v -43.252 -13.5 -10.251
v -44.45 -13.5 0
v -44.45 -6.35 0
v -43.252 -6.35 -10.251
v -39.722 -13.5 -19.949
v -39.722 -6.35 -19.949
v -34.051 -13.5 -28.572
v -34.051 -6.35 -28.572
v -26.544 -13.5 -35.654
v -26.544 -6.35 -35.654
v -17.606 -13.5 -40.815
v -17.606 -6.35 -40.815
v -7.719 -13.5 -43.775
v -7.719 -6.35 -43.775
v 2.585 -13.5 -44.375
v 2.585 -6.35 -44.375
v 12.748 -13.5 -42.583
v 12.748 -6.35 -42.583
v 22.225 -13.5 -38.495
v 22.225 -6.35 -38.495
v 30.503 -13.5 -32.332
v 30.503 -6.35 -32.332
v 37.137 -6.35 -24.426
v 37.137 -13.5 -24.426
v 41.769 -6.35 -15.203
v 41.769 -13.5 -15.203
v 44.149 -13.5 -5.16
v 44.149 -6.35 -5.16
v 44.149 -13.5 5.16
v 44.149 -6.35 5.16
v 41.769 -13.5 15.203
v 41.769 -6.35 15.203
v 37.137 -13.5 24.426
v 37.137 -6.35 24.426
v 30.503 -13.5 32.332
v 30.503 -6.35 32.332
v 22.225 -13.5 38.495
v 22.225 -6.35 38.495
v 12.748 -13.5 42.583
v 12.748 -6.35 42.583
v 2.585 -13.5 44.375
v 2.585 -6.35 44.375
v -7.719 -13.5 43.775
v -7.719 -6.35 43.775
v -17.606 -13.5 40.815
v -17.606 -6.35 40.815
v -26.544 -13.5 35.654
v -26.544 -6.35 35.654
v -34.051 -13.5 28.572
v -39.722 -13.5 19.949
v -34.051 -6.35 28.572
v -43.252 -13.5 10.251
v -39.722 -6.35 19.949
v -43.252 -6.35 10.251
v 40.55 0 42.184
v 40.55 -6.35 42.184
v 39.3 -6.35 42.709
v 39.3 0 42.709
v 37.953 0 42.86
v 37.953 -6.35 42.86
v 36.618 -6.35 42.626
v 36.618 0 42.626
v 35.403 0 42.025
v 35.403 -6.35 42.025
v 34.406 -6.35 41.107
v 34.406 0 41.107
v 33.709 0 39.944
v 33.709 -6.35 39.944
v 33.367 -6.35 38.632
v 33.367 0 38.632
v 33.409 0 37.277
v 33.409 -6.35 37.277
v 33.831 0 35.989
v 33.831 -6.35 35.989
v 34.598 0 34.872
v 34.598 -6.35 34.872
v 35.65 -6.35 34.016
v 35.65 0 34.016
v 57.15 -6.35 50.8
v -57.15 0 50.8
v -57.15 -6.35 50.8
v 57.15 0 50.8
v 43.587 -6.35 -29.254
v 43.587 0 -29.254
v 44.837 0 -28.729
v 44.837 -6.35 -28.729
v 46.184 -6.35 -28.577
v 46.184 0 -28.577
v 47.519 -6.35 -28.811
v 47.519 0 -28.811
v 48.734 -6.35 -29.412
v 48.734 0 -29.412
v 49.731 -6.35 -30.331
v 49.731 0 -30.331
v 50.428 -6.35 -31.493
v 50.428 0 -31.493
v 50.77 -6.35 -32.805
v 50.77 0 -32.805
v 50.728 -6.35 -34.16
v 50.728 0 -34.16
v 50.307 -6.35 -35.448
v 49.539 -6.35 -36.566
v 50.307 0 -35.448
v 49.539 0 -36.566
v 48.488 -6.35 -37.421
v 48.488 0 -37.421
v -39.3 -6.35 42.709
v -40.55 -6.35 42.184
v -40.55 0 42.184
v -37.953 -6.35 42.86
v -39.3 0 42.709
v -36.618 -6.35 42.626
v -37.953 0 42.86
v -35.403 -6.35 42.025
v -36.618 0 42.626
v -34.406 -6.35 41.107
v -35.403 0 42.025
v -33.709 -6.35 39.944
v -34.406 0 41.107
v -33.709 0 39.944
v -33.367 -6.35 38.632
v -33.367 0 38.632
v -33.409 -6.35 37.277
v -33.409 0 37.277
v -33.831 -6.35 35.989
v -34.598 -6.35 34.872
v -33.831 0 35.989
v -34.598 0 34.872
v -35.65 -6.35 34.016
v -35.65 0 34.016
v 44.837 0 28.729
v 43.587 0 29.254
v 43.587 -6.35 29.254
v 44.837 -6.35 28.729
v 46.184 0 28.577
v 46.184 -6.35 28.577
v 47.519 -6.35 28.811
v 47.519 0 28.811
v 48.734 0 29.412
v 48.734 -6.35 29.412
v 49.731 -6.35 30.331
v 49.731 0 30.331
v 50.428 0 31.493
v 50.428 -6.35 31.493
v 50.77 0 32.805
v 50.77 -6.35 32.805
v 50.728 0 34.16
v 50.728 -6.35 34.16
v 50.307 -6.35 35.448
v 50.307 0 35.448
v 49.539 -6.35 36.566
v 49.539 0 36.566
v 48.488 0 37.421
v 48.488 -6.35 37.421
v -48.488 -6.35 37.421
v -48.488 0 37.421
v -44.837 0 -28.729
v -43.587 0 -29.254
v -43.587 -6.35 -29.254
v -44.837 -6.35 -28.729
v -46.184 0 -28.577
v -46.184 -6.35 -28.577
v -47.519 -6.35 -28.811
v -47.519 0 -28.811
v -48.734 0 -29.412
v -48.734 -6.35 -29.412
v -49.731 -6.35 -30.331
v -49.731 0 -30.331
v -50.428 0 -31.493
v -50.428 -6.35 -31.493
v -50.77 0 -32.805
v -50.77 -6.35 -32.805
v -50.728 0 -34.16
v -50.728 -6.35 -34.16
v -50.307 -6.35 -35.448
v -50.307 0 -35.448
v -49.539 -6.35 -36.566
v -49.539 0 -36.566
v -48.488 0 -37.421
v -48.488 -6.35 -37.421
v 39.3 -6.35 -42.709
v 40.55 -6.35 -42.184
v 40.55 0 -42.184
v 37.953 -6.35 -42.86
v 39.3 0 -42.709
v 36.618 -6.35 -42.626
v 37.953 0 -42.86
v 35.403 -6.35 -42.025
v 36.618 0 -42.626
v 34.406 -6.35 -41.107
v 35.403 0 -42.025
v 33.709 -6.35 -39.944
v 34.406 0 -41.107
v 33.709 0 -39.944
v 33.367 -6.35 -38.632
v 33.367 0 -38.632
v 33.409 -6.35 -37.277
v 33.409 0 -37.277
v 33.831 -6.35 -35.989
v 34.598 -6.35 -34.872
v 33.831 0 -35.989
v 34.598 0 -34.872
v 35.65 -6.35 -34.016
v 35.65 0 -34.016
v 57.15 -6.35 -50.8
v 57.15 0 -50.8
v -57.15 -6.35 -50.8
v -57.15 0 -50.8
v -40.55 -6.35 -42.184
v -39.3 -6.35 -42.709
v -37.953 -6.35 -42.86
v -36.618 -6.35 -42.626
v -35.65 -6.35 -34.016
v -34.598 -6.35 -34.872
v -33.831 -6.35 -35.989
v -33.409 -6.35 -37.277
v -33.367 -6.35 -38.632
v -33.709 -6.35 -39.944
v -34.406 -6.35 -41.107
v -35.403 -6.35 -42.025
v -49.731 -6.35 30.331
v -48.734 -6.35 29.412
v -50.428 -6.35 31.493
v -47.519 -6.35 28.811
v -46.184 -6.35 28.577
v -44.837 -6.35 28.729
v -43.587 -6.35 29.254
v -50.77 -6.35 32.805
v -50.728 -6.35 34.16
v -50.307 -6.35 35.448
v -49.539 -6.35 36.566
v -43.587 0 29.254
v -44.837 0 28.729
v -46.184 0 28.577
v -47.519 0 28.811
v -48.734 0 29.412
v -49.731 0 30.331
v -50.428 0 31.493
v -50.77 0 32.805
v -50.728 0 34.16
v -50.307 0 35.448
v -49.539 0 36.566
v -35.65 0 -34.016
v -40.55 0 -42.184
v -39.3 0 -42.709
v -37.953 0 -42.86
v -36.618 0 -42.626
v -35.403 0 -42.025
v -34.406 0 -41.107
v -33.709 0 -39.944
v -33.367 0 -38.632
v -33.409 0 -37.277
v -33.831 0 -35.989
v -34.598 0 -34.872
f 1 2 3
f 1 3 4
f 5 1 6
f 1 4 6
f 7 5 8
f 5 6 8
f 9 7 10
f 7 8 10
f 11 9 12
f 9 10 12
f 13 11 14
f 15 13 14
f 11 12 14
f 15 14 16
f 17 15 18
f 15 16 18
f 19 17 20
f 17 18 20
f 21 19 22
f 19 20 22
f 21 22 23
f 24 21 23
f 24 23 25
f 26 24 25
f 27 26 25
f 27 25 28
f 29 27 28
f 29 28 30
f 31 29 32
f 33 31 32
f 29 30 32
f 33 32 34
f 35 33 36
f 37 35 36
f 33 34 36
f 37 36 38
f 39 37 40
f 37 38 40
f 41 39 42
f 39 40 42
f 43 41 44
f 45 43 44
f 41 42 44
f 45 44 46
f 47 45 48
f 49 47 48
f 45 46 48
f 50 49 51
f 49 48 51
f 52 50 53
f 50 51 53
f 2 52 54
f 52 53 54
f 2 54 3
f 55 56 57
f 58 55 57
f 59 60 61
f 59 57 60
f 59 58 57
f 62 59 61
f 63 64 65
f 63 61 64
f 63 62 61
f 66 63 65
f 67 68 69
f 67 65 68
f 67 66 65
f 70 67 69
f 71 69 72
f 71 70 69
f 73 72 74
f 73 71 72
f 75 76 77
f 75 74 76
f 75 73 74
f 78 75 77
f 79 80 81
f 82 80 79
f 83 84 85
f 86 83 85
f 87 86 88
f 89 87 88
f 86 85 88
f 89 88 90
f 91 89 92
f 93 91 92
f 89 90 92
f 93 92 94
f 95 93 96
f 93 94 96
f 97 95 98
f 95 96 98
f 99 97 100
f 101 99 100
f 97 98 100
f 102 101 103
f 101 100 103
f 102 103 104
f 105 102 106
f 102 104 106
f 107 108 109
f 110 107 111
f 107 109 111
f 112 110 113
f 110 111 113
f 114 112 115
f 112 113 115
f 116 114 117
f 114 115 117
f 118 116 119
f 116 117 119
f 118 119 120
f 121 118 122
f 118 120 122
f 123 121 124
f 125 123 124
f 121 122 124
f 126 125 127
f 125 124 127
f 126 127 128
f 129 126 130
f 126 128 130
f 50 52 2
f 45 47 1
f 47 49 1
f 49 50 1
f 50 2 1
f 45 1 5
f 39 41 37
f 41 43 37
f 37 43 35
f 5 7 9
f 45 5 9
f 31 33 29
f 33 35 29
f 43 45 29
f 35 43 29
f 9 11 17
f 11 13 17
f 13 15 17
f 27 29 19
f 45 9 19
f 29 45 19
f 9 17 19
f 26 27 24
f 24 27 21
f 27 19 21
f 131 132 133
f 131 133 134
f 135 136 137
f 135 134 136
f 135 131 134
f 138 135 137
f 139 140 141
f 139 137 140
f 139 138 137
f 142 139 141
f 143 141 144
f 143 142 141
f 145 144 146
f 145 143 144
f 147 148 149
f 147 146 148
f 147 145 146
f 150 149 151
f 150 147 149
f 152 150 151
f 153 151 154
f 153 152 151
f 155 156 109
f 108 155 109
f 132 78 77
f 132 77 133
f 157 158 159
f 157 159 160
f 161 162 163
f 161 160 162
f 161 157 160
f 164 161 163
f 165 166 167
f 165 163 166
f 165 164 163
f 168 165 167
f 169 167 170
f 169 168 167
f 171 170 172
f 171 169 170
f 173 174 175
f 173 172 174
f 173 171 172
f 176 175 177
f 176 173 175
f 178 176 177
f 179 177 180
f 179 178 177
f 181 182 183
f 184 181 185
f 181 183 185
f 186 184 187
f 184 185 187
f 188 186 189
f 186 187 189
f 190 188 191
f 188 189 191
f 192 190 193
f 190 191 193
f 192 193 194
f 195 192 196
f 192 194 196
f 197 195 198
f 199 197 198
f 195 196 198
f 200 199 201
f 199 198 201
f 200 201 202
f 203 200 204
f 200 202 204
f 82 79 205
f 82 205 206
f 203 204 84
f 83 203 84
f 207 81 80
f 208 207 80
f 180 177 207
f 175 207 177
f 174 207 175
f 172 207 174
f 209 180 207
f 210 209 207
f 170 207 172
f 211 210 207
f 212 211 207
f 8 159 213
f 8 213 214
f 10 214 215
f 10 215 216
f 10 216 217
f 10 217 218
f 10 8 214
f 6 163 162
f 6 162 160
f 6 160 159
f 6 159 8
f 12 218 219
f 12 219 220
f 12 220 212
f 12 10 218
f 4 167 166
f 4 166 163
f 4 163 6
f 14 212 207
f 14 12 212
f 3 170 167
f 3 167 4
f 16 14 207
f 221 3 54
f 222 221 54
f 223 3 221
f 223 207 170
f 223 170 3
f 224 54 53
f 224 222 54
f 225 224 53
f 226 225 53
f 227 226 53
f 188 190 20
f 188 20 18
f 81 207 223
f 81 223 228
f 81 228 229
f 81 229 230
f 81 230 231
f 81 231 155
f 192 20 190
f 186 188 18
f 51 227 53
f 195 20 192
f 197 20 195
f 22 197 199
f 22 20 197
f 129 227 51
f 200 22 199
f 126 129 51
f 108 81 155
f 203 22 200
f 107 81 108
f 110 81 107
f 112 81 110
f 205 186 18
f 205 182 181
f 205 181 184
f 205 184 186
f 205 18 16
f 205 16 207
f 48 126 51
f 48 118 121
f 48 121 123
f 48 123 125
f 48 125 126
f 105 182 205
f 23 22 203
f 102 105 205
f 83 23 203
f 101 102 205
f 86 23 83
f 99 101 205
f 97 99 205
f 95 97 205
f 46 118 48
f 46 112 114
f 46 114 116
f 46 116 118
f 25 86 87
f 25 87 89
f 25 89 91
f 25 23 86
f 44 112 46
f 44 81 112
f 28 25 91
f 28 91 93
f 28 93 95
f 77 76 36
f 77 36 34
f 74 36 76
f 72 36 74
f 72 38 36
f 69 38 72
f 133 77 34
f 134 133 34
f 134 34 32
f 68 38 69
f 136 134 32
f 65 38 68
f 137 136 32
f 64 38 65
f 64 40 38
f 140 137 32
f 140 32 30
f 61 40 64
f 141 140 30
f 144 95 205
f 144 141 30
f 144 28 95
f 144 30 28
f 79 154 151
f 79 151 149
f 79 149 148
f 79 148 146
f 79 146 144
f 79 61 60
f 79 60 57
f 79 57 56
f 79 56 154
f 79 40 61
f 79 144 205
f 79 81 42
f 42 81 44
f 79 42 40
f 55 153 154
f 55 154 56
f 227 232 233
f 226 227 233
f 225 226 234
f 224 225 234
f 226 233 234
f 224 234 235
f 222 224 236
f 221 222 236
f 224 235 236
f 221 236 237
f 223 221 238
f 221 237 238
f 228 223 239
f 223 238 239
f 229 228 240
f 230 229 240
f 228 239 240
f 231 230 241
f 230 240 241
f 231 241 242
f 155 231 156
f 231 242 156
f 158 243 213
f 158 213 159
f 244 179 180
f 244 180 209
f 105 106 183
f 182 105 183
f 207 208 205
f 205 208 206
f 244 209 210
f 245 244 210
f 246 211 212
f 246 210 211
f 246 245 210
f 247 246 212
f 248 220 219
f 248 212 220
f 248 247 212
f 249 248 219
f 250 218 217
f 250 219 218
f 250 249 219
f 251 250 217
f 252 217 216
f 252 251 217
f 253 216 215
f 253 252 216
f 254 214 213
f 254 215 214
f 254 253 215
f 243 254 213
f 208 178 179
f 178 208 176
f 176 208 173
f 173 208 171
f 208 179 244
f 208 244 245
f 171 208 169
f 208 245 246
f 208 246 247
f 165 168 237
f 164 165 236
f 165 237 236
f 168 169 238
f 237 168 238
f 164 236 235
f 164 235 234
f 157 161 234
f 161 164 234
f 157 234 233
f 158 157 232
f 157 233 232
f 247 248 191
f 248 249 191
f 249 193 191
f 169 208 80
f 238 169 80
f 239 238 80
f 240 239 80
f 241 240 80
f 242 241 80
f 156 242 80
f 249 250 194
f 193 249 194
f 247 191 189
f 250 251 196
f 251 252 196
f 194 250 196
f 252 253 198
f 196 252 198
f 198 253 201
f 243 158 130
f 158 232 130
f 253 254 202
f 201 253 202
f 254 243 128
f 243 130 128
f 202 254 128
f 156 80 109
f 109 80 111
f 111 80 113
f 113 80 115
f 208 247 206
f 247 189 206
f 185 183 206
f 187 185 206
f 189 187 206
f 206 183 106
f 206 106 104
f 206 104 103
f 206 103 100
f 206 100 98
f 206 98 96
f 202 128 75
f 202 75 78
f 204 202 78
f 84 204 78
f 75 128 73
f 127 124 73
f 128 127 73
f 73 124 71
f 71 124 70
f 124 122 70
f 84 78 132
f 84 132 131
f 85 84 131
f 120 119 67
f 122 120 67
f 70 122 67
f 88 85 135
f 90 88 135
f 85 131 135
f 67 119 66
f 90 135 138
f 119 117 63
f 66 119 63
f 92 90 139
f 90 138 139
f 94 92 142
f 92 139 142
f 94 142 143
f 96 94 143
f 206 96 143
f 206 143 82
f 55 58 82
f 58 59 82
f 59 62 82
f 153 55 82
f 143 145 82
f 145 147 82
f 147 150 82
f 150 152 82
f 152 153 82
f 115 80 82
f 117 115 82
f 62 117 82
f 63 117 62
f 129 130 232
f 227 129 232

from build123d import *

# Parameters (mm, degrees)
SKETCH1_W               = 114.3
SKETCH1_H               = 6.35
BOSS_EXTRUDE1_DEPTH     = 50.8
F_1_2_HOLES_DEPTH       = 77.727342
BOSS_EXTRUDE5_DEPTH     = 6.35
BOSS_EXTRUDE6_DEPTH     = 4.7625
SKETCH15_R              = 3.96875
BOSS_EXTRUDE7_DEPTH     = 2.54
SKETCH16_R              = 6.35
BOSS_EXTRUDE8_DEPTH     = 4.7625
SKETCH7_W               = 200.622007
SKETCH7_H               = 97.79
BOSS_EXTRUDE2_DEPTH     = 225.2599
CUT_EXTRUDE1_DEPTH      = 322.008202
CUT_EXTRUDE1_DEPTH_BACK = 322.008202
CUT_EXTRUDE3_DEPTH      = 230.782863
CUT_EXTRUDE3_DEPTH_BACK = 230.782863
SKETCH9_OUTSIDE_W       = 174.676
SKETCH9_OUTSIDE_H       = 325.489
BOSS_EXTRUDE3_DEPTH     = 7.9375
SKETCH11_OUTSIDE_W      = 1426.344
SKETCH11_OUTSIDE_H      = 1450.156
SKETCH11_OUTSIDE_R      = 11.1125
CUT_EXTRUDE4_DEPTH      = 324.56132
CUT_EXTRUDE4_DRAFT      = -60
SKETCH12_R              = 10.795
BOSS_EXTRUDE4_DEPTH     = 85.09
SKETCH17_R              = 1440.18
CUT_EXTRUDE5_DEPTH      = 1397


with BuildPart() as part:
    # Sketch1 → Boss-Extrude1 (new, symmetric)
    with BuildSketch(Plane.XY):
        with Locations((0, -3.175)):
            Rectangle(SKETCH1_W, SKETCH1_H)
    extrude(amount=BOSS_EXTRUDE1_DEPTH, both=True)

    # Sketch2 → 1-2 holes (cut, through all)
    with BuildSketch(Plane(origin=(0, 0, 0), x_dir=(1, 0, 0), z_dir=(0, 1, 0))):
        with BuildLine():
            Line((-35.649714, 34.01619), (-43.587214, 29.25369))
            ThreePointArc((-43.587214, 29.25369), (-50.12131, 30.887214), (-48.487786, 37.42131))
            Line((-48.487786, 37.42131), (-40.550286, 42.18381))
            ThreePointArc((-40.550286, 42.18381), (-34.01619, 40.550286), (-35.649714, 34.01619))
        make_face()
        with BuildLine():
            Line((-35.649714, -34.01619), (-43.587214, -29.25369))
            ThreePointArc((-43.587214, -29.25369), (-50.12131, -30.887214), (-48.487786, -37.42131))
            Line((-48.487786, -37.42131), (-40.550286, -42.18381))
            ThreePointArc((-40.550286, -42.18381), (-34.01619, -40.550286), (-35.649714, -34.01619))
        make_face()
        with BuildLine():
            Line((35.649714, 34.01619), (43.587214, 29.25369))
            ThreePointArc((43.587214, 29.25369), (50.12131, 30.887214), (48.487786, 37.42131))
            Line((48.487786, 37.42131), (40.550286, 42.18381))
            ThreePointArc((40.550286, 42.18381), (34.01619, 40.550286), (35.649714, 34.01619))
        make_face()
        with BuildLine():
            Line((35.649714, -34.01619), (43.587214, -29.25369))
            ThreePointArc((43.587214, -29.25369), (50.12131, -30.887214), (48.487786, -37.42131))
            Line((48.487786, -37.42131), (40.550286, -42.18381))
            ThreePointArc((40.550286, -42.18381), (34.01619, -40.550286), (35.649714, -34.01619))
        make_face()
    extrude(amount=-F_1_2_HOLES_DEPTH, mode=Mode.SUBTRACT)


with BuildPart() as body_2:
    # Sketch4 → Revolve1 (revolve)
    with BuildSketch(Plane.XY, mode=Mode.PRIVATE) as revolve1_sk:
        Polygon((0, -27.1526), (43.18, -27.1526), (43.18, -16.0401), (40.64, -16.0401), (40.64, -13.5001), (44.45, -13.5001), (44.45, -6.35), (0, -6.35), align=None)
    revolve(revolve1_sk.sketch.rotate(Axis((0, -6.35, 0), (0, -1, 0)), 180), axis=Axis((0, -6.35, 0), (0, -1, 0)))


with BuildPart() as body_3:
    # Sketch6 → Revolve2 (revolve)
    with BuildSketch(Plane(origin=(-69.85, 0, 0), x_dir=(0, 0, -1), z_dir=(1, 0, 0)), mode=Mode.PRIVATE) as revolve2_sk:
        with BuildLine():
            Line((-35.56, -89.8525), (-35.56, -62.143409))
            ThreePointArc((-35.56, -62.143409), (-31.772624, -52.999876), (-22.629091, -49.2125))
            Line((-22.629091, -49.2125), (-19.800455, -49.2125))
            Line((-19.800455, -49.2125), (-19.800455, -51.59375))
            Line((-19.800455, -51.59375), (-14.143182, -51.59375))
            Line((-14.143182, -51.59375), (-14.143182, -49.2125))
            Line((-14.143182, -49.2125), (-8.485909, -49.2125))
            Line((-8.485909, -49.2125), (-8.485909, -51.59375))
            Line((-8.485909, -51.59375), (-2.828636, -51.59375))
            Line((-2.828636, -51.59375), (-2.828636, -49.2125))
            Line((-2.828636, -49.2125), (2.828636, -49.2125))
            Line((2.828636, -49.2125), (2.828636, -51.59375))
            Line((2.828636, -51.59375), (8.485909, -51.59375))
            Line((8.485909, -51.59375), (8.485909, -49.2125))
            Line((8.485909, -49.2125), (14.143182, -49.2125))
            Line((14.143182, -49.2125), (14.143182, -51.59375))
            Line((14.143182, -51.59375), (19.800455, -51.59375))
            Line((19.800455, -51.59375), (19.800455, -49.2125))
            Line((19.800455, -49.2125), (22.629091, -49.2125))
            ThreePointArc((22.629091, -49.2125), (31.772624, -52.999876), (35.56, -62.143409))
            Line((35.56, -62.143409), (35.56, -89.8525))
            Line((35.56, -89.8525), (36.83, -89.8525))
            Line((36.83, -89.8525), (36.83, -92.3925))
            Line((36.83, -92.3925), (33.655, -92.3925))
            ThreePointArc((33.655, -92.3925), (29.164872, -94.252372), (27.305, -98.7425))
            ThreePointArc((27.305, -98.7425), (25.636711, -103.032498), (21.508439, -105.068336))
            Line((21.508439, -105.068336), (5.438281, -106.474293))
            ThreePointArc((5.438281, -106.474293), (3.374144, -107.492212), (2.54, -109.637211))
            Line((2.54, -109.637211), (2.54, -130.175))
            Line((2.54, -130.175), (36.83, -130.175))
            Line((36.83, -130.175), (40.005, -130.175))
            Line((40.005, -130.175), (40.005, -150.8125))
            Line((40.005, -150.8125), (-40.005, -150.8125))
            Line((-40.005, -150.8125), (-40.005, -130.175))
            Line((-40.005, -130.175), (-36.83, -130.175))
            Line((-36.83, -130.175), (-2.54, -130.175))
            Line((-2.54, -130.175), (-2.54, -109.637211))
            ThreePointArc((-2.54, -109.637211), (-3.374144, -107.492212), (-5.438281, -106.474293))
            Line((-5.438281, -106.474293), (-21.508439, -105.068336))
            ThreePointArc((-21.508439, -105.068336), (-25.636711, -103.032498), (-27.305, -98.7425))
            ThreePointArc((-27.305, -98.7425), (-29.164872, -94.252372), (-33.655, -92.3925))
            Line((-33.655, -92.3925), (-36.83, -92.3925))
            Line((-36.83, -92.3925), (-36.83, -89.8525))
            Line((-36.83, -89.8525), (-35.56, -89.8525))
        make_face()
    revolve(revolve2_sk.sketch.rotate(Axis((-69.85, -150.8125, 111.145304), (0, 0, -1)), 90), axis=Axis((-69.85, -150.8125, 111.145304), (0, 0, -1)))

    # Sketch13 → Boss-Extrude5 (add)
    with BuildSketch(Plane.XY.offset(2.54)):
        with BuildLine():
            ThreePointArc((-101.041813, -136.474589), (-98.965326, -121.697174), (-84.187911, -119.620687))
            ThreePointArc((-84.187911, -119.620687), (-69.85, -123.32907), (-55.512089, -119.620687))
            ThreePointArc((-55.512089, -119.620687), (-40.734674, -121.697174), (-38.658187, -136.474589))
            ThreePointArc((-38.658187, -136.474589), (-42.36657, -150.8125), (-38.658187, -165.150411))
            ThreePointArc((-38.658187, -165.150411), (-40.734674, -179.927826), (-55.512089, -182.004313))
            ThreePointArc((-55.512089, -182.004313), (-69.85, -178.29593), (-84.187911, -182.004313))
            ThreePointArc((-84.187911, -182.004313), (-98.965326, -179.927826), (-101.041813, -165.150411))
            ThreePointArc((-101.041813, -165.150411), (-97.33343, -150.8125), (-101.041813, -136.474589))
        make_face()
    extrude(amount=BOSS_EXTRUDE5_DEPTH)

    # Sketch14 → Boss-Extrude6 (add)
    with BuildSketch(Plane.XY.offset(8.89)):
        Polygon((-94.124523, -132.037239), (-89.362023, -129.287608), (-89.362023, -123.788347), (-94.124523, -121.038716), (-98.887023, -123.788347), (-98.887023, -129.287608), align=None)
        Polygon((-40.812977, -129.287608), (-45.575477, -132.037239), (-50.337977, -129.287608), (-50.337977, -123.788347), (-45.575477, -121.038716), (-40.812977, -123.788347), align=None)
        Polygon((-45.575477, -169.587761), (-50.337977, -172.337392), (-50.337977, -177.836653), (-45.575477, -180.586284), (-40.812977, -177.836653), (-40.812977, -172.337392), align=None)
        Polygon((-98.887023, -172.337392), (-94.124523, -169.587761), (-89.362023, -172.337392), (-89.362023, -177.836653), (-94.124523, -180.586284), (-98.887023, -177.836653), align=None)
    extrude(amount=BOSS_EXTRUDE6_DEPTH)

    # Sketch15 → Boss-Extrude7 (add)
    with BuildSketch(Plane.XY.offset(13.6525)):
        with Locations((-94.124523, -126.537977)):
            Circle(SKETCH15_R)
        with Locations(Location((-45.575477, -126.537977, 0), (0, 0, 180))):
            Circle(SKETCH15_R)
        with Locations(Location((-94.124523, -175.087023, 0), (0, 0, 180))):
            Circle(SKETCH15_R)
        with Locations((-45.575477, -175.087023)):
            Circle(SKETCH15_R)
    extrude(amount=BOSS_EXTRUDE7_DEPTH)

    # Sketch16 → Boss-Extrude8 (add)
    with BuildSketch(Plane(origin=(0, 0, -2.54), x_dir=(-1, 0, 0), z_dir=(0, 0, -1))):
        with Locations(Location((45.575477, -126.537977, 0), (0, 0, 180))):
            Circle(SKETCH16_R)
        with Locations(Location((94.124523, -126.537977, 0), (0, 0, 180))):
            Circle(SKETCH16_R)
        with Locations(Location((94.124523, -175.087023, 0), (0, 0, 180))):
            Circle(SKETCH16_R)
        with Locations(Location((45.575477, -175.087023, 0), (0, 0, 180))):
            Circle(SKETCH16_R)
    extrude(amount=BOSS_EXTRUDE8_DEPTH)



with BuildPart() as body_4:
    # Sketch7 → Boss-Extrude2 (new body)
    with BuildSketch(Plane.XZ.offset(27.1526)):
        with Locations((-71.138996, 0)):
            Rectangle(SKETCH7_W, SKETCH7_H)
    extrude(amount=BOSS_EXTRUDE2_DEPTH)

    # Sketch8 → Cut-Extrude1 (cut, two sides: drawn at the far end of the back side and taken through both)
    with BuildSketch(Plane.XY.offset(48.895).offset(-CUT_EXTRUDE1_DEPTH_BACK)):
        with BuildLine():
            Line((330.801873, 506.841945), (29.172007, -27.1526))
            Line((29.172007, -27.1526), (-47.734278, -163.304692))
            ThreePointArc((-47.734278, -163.304692), (-82.342192, -172.928222), (-91.965722, -138.320308))
            Line((-91.965722, -138.320308), (-29.172007, -27.1526))
            Line((-29.172007, -27.1526), (272.457858, 506.841945))
            Line((272.457858, 506.841945), (272.457858, -719.748043))
            Line((272.457858, -719.748043), (330.801873, -719.748043))
            Line((330.801873, -719.748043), (330.801873, 506.841945))
        make_face()
    extrude(amount=CUT_EXTRUDE1_DEPTH + CUT_EXTRUDE1_DEPTH_BACK, mode=Mode.SUBTRACT)

    # Sketch9 outside → Cut-Extrude3 (cut, two sides: drawn at the far end of the back side and taken through both)
    with BuildSketch(Plane(origin=(0, -144.306694, 0), x_dir=(0, 0, -1), z_dir=(-1, 0, 0)).offset(-CUT_EXTRUDE3_DEPTH_BACK)):
        with Locations((0, -18.1005)):
            Rectangle(SKETCH9_OUTSIDE_W, SKETCH9_OUTSIDE_H)
        Polygon((48.895, 108.105806), (48.895, -95.094194), (31.835615, -117.154094), (25.485615, -117.154094), (42.545, -95.094194), (42.545, 108.105806), align=None, mode=Mode.SUBTRACT)
        Polygon((-25.485615, -117.154094), (-31.835615, -117.154094), (-48.895, -95.094194), (-48.895, 108.105806), (-42.545, 108.105806), (-42.545, -95.094194), align=None, mode=Mode.SUBTRACT)
    extrude(amount=CUT_EXTRUDE3_DEPTH + CUT_EXTRUDE3_DEPTH_BACK, mode=Mode.SUBTRACT)


with BuildPart() as cut_extrude3_piece_1:
    # of the separate pieces the step leaves, piece 1, a body of its own (cut_extrude3_pieces)
    add(body_4.part.solids().sort_by_distance((16.711347, -49.2125, 48.895))[0])


with BuildPart() as cut_extrude3_piece_2:
    # of the separate pieces the step leaves, piece 2, a body of its own (cut_extrude3_pieces)
    add(body_4.part.solids().sort_by_distance((29.172007, -27.1526, -31.835615))[0])


with BuildPart() as body_6:
    # Sketch10 → Boss-Extrude3 (new body)
    with BuildSketch(Plane.XY.offset(48.895)):
        Polygon((-69.85, -137.98089), (-80.9625, -144.396695), (-80.9625, -157.228305), (-69.85, -163.64411), (-58.7375, -157.228305), (-58.7375, -144.396695), align=None)
    extrude(amount=BOSS_EXTRUDE3_DEPTH)


with BuildPart() as cut_extrude4_tool:
    # Sketch11 outside → Cut-Extrude4 (with draft: the straight prism first)
    with BuildSketch(Plane.XY.offset(56.8325)):
        with Locations((-57.15, -126.206)):
            Rectangle(SKETCH11_OUTSIDE_W, SKETCH11_OUTSIDE_H)
        with Locations((-69.85, -150.8125)):
            Circle(SKETCH11_OUTSIDE_R, mode=Mode.SUBTRACT)
    extrude(amount=-CUT_EXTRUDE4_DEPTH)
    # Cut-Extrude4: the draft: its side faces are tilted about the plane it starts from
    cut_extrude4_sides = [cut_extrude4_tool.faces().sort_by_distance(p)[0] for p in [
        (-57.15, -851.284, -105.44816),
        (656.022, -126.206, -105.44816),
        (-57.15, 598.872, -105.44816),
        (-770.322, -126.206, -105.44816),
        (-80.9625, -150.8125, -105.44816),
    ]]
    draft(cut_extrude4_sides, Plane.XY.offset(56.8325), CUT_EXTRUDE4_DRAFT)


with BuildPart() as body_6_1:
    add(body_6.part)

    # Cut-Extrude4: cut by cut_extrude4_tool
    add(cut_extrude4_tool.part, mode=Mode.SUBTRACT)


with BuildPart() as body_7:
    # Mirror1: mirrored copy
    add(body_6_1.part.mirror(Plane.XY))


with BuildPart() as body_3_1:
    add(body_3.part)

    add(cut_extrude3_piece_1.part)  # Boss-Extrude4 merges Cut-Extrude3 piece 1

    add(cut_extrude3_piece_2.part)  # Boss-Extrude4 merges Cut-Extrude3 piece 2
    # Sketch12 → Boss-Extrude4 (add)
    with BuildSketch(Plane.XY.offset(-42.545)):
        with Locations((-69.85, -150.8125)):
            Circle(SKETCH12_R)
    extrude(amount=BOSS_EXTRUDE4_DEPTH)

    # Combine1: union body 7, body 6, body 2, part
    add(body_7.part)
    add(body_6_1.part)
    add(body_2.part)
    add(part.part)

    # Sketch17 → Cut-Extrude5 (cut)
    with BuildSketch(Plane.XZ.offset(13.5001)):
        Circle(SKETCH17_R)
    extrude(amount=CUT_EXTRUDE5_DEPTH, mode=Mode.SUBTRACT)


solid = body_3_1.part
